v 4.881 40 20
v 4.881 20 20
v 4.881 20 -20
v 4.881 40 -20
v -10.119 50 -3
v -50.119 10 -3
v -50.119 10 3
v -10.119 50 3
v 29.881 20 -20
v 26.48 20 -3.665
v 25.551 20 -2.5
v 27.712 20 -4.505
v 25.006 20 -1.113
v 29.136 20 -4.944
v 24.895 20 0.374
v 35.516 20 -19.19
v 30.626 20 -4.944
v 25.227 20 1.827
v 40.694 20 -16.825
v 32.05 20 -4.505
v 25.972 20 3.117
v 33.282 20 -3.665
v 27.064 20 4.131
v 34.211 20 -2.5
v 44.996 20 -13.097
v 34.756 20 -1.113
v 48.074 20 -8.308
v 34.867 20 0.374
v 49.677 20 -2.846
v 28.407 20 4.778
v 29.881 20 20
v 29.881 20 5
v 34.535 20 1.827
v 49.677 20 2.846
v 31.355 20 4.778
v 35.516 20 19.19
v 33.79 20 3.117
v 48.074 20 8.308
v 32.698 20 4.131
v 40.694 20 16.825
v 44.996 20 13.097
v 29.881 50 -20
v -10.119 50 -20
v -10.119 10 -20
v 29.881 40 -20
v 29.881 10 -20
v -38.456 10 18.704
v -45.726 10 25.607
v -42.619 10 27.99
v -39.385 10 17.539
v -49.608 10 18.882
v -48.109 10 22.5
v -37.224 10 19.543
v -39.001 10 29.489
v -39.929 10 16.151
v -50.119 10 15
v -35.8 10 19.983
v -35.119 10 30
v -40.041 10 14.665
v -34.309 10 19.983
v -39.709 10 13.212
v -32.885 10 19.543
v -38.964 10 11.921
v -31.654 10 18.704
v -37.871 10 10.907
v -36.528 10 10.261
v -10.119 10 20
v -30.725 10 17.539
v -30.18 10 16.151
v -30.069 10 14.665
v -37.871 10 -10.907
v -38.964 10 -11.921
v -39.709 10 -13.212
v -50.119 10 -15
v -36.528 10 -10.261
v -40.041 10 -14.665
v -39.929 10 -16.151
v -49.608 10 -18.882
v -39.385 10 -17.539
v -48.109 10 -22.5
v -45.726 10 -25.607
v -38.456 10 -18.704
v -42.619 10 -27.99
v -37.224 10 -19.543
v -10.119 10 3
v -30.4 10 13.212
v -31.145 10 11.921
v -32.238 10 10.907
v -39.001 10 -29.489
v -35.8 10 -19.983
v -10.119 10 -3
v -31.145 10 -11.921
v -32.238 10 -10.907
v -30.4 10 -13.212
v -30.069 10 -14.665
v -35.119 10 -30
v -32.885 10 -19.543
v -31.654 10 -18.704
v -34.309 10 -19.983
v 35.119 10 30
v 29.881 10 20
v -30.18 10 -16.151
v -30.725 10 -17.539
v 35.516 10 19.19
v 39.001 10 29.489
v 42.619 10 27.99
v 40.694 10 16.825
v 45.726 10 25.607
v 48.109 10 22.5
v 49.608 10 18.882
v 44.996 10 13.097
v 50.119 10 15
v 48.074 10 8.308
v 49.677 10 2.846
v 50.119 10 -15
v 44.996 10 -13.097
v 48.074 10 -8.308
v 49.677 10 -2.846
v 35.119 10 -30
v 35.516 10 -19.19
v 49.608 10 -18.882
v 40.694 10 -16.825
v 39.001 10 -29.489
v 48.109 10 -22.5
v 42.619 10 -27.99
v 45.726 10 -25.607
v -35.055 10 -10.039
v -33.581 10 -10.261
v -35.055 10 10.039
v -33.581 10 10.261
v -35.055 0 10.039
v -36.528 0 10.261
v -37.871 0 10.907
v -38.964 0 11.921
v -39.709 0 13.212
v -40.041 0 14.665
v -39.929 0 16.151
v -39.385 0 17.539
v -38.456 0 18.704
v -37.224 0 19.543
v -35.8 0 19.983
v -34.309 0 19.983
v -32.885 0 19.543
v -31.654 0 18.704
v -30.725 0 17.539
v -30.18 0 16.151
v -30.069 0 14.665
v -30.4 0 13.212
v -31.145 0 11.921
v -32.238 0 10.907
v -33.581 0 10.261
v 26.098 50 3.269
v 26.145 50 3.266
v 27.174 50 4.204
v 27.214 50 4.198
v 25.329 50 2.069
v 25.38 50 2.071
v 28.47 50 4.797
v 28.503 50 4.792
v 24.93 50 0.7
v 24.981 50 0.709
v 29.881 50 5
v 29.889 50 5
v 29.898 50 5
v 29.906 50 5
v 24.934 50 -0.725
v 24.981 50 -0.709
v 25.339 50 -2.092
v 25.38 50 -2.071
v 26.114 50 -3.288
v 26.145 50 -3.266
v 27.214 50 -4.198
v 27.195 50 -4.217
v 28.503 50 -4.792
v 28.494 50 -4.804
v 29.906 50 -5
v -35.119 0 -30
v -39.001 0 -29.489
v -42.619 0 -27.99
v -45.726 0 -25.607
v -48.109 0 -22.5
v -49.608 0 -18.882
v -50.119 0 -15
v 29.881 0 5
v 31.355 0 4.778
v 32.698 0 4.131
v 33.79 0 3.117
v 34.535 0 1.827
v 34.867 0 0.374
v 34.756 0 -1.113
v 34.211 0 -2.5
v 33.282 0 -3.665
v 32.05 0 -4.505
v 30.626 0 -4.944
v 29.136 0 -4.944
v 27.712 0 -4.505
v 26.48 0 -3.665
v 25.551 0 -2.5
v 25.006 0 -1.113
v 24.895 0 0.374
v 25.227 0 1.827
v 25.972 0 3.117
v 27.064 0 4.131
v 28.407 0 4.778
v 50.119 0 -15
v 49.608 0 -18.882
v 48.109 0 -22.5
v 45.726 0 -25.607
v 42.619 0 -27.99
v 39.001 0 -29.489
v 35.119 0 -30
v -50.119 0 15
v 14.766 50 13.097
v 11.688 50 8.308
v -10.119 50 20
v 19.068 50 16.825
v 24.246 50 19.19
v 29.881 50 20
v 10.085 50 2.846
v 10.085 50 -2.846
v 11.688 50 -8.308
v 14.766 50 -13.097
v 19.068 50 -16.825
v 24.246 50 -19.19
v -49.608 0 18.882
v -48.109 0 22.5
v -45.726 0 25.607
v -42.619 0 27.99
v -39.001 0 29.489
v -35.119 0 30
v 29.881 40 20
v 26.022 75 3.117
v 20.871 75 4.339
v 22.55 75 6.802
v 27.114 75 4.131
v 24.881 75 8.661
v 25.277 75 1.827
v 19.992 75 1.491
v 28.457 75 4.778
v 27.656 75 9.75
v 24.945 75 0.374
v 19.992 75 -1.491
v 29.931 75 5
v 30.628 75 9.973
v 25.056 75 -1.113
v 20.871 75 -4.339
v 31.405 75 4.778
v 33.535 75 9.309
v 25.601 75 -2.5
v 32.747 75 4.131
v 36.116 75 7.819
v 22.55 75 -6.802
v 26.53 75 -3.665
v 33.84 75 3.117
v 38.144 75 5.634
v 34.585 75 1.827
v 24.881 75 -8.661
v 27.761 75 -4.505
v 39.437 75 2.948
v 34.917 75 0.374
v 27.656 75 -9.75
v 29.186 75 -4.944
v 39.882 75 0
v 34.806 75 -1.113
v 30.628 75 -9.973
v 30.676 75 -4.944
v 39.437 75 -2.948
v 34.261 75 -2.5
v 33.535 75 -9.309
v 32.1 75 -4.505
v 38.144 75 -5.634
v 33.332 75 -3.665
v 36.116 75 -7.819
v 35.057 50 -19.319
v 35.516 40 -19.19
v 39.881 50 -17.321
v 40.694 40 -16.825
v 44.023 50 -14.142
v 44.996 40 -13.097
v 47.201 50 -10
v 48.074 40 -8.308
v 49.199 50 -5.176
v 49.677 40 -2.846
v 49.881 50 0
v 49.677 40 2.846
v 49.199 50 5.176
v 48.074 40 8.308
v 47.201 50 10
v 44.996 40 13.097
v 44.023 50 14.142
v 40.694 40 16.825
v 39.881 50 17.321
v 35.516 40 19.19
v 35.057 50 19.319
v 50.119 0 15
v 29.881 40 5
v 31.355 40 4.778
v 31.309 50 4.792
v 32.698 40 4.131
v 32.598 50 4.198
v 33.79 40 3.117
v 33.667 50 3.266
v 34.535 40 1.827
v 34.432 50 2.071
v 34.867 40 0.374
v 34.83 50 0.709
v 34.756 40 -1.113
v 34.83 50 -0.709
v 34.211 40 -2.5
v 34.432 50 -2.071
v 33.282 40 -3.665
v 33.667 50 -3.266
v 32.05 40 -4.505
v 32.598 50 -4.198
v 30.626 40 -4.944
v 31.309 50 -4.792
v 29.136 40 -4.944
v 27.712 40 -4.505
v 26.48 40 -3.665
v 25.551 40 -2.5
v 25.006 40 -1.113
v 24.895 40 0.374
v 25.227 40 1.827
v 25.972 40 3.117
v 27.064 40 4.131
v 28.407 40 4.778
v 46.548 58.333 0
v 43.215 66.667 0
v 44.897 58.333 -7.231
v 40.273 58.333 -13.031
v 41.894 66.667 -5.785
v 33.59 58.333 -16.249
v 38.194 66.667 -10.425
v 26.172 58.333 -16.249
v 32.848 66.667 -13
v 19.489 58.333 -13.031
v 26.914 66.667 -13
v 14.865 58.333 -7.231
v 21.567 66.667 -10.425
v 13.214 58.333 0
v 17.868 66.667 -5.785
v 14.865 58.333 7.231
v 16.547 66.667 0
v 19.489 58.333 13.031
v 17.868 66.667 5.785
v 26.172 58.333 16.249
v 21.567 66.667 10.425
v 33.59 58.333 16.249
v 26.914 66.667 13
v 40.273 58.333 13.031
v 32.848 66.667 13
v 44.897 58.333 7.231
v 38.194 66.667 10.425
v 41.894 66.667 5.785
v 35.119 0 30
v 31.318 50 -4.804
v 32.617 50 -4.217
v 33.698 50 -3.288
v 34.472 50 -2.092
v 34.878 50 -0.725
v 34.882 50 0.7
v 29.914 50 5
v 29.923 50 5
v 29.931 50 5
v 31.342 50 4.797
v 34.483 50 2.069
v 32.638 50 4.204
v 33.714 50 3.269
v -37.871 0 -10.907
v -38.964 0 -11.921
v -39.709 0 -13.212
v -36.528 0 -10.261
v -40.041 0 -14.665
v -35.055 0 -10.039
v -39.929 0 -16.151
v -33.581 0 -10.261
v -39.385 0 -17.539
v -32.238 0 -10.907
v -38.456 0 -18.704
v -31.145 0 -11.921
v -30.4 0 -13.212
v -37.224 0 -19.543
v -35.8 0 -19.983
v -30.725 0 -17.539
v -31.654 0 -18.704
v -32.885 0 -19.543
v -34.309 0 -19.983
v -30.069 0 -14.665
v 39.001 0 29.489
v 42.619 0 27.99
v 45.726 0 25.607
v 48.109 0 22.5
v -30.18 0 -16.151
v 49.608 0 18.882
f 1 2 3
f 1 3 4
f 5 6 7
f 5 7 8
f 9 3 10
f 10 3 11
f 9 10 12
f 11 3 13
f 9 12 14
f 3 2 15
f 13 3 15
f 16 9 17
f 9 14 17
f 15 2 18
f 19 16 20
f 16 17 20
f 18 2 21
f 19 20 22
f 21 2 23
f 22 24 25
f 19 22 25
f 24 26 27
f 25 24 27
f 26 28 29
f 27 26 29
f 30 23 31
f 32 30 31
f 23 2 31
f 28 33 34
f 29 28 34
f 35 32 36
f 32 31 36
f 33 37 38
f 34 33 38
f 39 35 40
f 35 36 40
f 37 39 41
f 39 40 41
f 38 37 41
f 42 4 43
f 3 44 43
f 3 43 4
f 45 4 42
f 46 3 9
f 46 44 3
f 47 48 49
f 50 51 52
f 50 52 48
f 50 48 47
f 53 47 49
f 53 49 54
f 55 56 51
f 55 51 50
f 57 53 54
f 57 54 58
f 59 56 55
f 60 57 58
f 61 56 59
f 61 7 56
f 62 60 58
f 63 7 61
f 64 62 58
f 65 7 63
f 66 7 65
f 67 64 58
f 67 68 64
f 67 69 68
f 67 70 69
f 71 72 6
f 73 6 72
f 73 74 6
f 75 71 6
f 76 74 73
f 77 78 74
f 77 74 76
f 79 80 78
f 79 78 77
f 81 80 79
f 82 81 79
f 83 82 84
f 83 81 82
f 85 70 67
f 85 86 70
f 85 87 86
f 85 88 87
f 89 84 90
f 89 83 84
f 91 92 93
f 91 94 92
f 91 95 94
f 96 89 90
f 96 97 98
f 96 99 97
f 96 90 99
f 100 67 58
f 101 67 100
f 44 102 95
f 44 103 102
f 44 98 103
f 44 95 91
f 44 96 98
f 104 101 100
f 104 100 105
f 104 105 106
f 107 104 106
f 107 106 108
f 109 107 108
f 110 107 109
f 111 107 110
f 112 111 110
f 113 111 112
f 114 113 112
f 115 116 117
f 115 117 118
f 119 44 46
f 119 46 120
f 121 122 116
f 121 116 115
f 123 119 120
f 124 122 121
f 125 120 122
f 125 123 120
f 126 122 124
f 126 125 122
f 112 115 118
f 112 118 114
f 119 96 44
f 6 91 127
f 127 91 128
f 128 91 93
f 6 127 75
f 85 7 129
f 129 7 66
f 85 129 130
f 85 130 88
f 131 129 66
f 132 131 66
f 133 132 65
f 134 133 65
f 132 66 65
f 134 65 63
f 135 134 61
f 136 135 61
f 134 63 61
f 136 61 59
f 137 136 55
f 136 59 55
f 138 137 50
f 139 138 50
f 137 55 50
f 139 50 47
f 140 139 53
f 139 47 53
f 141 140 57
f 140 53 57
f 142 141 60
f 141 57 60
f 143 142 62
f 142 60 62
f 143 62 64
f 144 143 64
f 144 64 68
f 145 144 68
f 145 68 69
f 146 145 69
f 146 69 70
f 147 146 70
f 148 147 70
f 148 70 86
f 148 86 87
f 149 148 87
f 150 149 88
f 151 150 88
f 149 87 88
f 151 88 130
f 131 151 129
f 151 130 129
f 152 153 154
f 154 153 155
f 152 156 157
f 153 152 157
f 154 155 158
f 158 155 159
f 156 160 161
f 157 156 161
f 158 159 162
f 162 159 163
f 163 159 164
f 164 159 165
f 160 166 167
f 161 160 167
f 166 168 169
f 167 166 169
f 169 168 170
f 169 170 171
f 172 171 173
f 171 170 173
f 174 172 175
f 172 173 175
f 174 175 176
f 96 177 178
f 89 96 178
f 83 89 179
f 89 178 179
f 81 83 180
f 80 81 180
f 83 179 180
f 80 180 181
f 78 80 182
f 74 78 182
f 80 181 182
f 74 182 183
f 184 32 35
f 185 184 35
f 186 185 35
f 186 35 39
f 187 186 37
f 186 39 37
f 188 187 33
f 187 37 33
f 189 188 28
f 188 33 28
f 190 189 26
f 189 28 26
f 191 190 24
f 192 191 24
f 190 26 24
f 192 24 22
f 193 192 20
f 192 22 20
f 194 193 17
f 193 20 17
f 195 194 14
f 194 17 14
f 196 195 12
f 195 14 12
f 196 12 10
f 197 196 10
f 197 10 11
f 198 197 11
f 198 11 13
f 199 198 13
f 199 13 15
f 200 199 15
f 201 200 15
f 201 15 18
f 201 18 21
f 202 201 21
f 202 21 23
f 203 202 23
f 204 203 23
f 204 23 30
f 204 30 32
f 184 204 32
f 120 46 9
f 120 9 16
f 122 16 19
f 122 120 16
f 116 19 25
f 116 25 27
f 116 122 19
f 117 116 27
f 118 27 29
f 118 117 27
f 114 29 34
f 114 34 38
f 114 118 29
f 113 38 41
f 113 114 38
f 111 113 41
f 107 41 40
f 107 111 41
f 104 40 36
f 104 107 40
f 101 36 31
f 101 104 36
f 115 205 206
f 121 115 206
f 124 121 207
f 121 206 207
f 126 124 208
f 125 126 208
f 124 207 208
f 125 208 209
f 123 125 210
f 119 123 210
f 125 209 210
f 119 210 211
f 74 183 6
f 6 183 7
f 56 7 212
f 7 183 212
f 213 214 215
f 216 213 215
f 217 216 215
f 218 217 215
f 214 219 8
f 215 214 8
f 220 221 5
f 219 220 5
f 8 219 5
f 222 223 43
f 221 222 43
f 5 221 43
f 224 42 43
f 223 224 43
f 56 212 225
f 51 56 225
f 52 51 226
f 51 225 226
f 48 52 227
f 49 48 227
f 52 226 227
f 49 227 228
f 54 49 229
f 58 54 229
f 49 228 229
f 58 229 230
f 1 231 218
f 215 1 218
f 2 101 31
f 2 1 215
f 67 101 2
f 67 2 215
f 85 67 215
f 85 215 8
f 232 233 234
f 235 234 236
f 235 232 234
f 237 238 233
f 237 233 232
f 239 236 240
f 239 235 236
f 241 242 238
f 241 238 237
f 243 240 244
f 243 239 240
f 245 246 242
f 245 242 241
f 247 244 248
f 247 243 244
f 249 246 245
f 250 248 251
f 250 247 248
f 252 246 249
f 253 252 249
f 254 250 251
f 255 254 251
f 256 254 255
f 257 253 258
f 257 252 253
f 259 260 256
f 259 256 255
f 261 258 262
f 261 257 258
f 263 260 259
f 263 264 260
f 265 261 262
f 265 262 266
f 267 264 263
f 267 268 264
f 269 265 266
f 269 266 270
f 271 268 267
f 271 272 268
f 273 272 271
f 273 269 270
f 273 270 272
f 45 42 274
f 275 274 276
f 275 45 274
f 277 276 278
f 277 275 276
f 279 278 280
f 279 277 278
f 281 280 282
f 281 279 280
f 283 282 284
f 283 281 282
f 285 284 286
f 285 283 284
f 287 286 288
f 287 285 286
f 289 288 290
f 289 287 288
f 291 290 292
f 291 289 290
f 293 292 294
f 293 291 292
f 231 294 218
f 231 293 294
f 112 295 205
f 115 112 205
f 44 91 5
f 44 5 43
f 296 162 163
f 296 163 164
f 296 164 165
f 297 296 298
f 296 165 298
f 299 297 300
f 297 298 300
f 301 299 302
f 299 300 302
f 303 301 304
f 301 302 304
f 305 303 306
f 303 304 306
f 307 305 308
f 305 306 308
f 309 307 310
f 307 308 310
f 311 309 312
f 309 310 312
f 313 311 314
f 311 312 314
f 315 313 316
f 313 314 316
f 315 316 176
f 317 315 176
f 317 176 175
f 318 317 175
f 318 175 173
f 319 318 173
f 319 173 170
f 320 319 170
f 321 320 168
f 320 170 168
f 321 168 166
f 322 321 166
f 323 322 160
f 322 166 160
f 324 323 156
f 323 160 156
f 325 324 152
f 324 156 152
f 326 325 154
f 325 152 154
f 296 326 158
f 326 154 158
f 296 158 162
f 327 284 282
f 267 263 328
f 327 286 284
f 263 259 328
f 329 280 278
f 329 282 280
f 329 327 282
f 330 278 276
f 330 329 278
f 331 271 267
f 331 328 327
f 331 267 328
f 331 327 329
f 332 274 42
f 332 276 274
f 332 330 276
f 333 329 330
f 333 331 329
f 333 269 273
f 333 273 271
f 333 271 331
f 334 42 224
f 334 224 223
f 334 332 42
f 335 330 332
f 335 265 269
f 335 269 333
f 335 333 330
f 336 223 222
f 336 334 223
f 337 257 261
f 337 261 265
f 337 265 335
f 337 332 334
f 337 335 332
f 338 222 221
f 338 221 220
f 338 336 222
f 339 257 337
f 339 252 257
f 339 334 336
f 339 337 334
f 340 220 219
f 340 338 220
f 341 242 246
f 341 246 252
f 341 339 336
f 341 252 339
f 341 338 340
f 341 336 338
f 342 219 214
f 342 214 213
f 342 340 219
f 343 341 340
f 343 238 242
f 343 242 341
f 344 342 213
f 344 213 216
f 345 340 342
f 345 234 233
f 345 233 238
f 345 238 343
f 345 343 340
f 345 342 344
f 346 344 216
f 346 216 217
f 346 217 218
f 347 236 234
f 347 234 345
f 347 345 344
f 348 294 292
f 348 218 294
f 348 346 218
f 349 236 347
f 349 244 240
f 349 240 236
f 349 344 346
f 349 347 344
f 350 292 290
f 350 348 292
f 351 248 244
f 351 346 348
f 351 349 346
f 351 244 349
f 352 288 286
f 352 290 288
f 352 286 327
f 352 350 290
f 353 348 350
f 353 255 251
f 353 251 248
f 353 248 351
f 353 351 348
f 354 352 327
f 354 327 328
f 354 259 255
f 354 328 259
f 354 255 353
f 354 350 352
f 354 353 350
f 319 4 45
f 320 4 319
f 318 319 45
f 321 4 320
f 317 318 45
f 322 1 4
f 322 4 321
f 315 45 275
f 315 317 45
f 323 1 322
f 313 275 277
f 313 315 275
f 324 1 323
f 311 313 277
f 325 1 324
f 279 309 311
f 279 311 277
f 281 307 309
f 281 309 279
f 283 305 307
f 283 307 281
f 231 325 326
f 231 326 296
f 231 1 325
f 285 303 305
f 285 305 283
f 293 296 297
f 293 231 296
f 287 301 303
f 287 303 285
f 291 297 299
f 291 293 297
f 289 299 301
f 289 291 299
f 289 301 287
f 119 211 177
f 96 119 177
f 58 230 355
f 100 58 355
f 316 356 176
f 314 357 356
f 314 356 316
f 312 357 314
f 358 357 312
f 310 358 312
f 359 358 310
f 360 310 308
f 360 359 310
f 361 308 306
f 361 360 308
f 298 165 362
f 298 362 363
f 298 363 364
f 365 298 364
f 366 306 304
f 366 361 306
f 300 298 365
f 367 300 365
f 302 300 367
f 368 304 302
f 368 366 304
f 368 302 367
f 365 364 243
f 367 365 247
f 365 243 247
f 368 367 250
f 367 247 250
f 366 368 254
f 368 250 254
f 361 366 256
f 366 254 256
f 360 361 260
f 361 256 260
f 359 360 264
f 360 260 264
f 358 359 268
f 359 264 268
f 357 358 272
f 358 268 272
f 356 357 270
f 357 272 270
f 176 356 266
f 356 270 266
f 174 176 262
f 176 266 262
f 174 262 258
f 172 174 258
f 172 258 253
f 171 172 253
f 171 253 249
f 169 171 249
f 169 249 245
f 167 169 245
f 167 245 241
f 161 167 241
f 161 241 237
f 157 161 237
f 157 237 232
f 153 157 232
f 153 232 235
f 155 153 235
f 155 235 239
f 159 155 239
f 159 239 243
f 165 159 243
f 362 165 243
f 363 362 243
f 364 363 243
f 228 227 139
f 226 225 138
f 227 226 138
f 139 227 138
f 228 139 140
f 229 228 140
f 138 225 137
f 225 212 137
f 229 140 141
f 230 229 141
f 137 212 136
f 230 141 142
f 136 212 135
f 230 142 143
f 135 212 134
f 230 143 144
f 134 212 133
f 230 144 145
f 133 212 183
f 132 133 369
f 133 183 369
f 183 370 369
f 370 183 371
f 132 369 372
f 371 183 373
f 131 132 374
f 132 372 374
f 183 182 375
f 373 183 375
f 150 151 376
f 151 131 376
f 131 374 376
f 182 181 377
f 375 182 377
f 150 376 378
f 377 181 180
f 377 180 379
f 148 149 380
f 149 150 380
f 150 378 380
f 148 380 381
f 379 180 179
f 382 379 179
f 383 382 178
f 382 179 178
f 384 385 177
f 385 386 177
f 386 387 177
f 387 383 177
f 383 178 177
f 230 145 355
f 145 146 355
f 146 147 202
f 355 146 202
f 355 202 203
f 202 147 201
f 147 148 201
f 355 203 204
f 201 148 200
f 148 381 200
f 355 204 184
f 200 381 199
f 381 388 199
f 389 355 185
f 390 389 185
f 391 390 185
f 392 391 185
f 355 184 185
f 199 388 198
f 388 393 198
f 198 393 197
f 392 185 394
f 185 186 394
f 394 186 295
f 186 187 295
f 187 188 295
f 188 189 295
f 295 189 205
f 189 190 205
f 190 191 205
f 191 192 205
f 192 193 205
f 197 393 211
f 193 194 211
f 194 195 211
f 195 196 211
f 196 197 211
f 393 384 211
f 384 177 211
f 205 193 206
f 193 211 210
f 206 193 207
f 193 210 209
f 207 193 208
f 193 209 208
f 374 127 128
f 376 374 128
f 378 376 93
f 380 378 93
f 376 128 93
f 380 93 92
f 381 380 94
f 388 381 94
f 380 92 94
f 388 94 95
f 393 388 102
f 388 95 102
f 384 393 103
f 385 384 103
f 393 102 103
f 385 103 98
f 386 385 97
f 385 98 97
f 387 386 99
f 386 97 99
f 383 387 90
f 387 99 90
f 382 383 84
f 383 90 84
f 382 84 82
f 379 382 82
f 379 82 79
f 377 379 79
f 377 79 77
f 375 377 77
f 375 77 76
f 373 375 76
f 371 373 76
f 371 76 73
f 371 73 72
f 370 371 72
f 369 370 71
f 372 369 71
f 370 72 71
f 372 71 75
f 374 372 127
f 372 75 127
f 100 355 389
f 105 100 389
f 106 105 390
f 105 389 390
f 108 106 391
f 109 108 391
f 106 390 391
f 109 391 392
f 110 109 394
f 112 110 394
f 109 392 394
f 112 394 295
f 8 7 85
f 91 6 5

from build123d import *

# Parameters (mm, degrees)
BOSS_EXTRUDE4_DEPTH = 10
SKETCH4_R           = 5
CUT_EXTRUDE2_DEPTH  = 10
BOSS_EXTRUDE5_DEPTH = 40
SKETCH6_R           = 5
CUT_EXTRUDE4_DEPTH  = 60
SKETCH7_W           = 45
SKETCH7_H           = 20
CUT_EXTRUDE5_DEPTH  = 40
RIB1_REACH          = 78.889
SKETCH8_WALL_W      = 212.346557286
SKETCH8_WALL_H      = 6
SKETCH9_R           = 20
BOSS_EXTRUDE7_DEPTH = 25
BOSS_EXTRUDE7_TAPER = 21.8
SKETCH15_R          = 5
CUT_EXTRUDE6_DEPTH  = 25


with BuildPart() as part:
    # Sketch1 → Boss-Extrude4 (new body)
    with BuildSketch(Plane(origin=(0, 0, 0), x_dir=(1, 0, 0), z_dir=(0, 1, 0))):
        with BuildLine():
            Line((-35.119052847, -30), (35.119052847, -30))
            ThreePointArc((35.119052847, -30), (45.725654565, -25.606601718), (50.119052847, -15))
            Line((50.119052847, -15), (50.119052847, 15))
            ThreePointArc((50.119052847, 15), (45.725654565, 25.606601718), (35.119052847, 30))
            Line((35.119052847, 30), (-35.119052847, 30))
            ThreePointArc((-35.119052847, 30), (-45.725654565, 25.606601718), (-50.119052847, 15))
            Line((-50.119052847, 15), (-50.119052847, -15))
            ThreePointArc((-50.119052847, -15), (-45.725654565, -25.606601718), (-35.119052847, -30))
        make_face()
    extrude(amount=BOSS_EXTRUDE4_DEPTH)

    # Sketch4 → Cut-Extrude2 (cut)
    with BuildSketch(Plane(origin=(0, 10, 0), x_dir=(1, 0, 0), z_dir=(0, 1, 0))):
        with Locations(Location((-35.054653665, 15.038511516, 0), (0, 0, 270))):
            Circle(SKETCH4_R)
        with Locations(Location((-35.054653665, -15.038511516, 0), (0, 0, 90))):
            Circle(SKETCH4_R)
    extrude(amount=-CUT_EXTRUDE2_DEPTH, mode=Mode.SUBTRACT)

    # Sketch5 → Boss-Extrude5 (add)
    with BuildSketch(Plane(origin=(0, 10, 0), x_dir=(1, 0, 0), z_dir=(0, 1, 0))):
        with BuildLine():
            Line((-10.119052847, -20), (-10.119052847, 20))
            Line((-10.119052847, 20), (29.880947153, 20))
            ThreePointArc((29.880947153, 20), (49.880947153, 0), (29.880947153, -20))
            Line((29.880947153, -20), (-10.119052847, -20))
        make_face()
    extrude(amount=BOSS_EXTRUDE5_DEPTH)

    # Sketch6 → Cut-Extrude4 (cut)
    with BuildSketch(Plane(origin=(0, 50, 0), x_dir=(1, 0, 0), z_dir=(0, 1, 0))):
        with Locations(Location((29.880947153, 0, 0), (0, 0, 270))):
            Circle(SKETCH6_R)
    extrude(amount=-CUT_EXTRUDE4_DEPTH, mode=Mode.SUBTRACT)

    # Sketch7 → Cut-Extrude5 (cut)
    with BuildSketch(Plane.XY.offset(20)):
        with Locations((27.380947153, 30)):
            Rectangle(SKETCH7_W, SKETCH7_H)
    extrude(amount=-CUT_EXTRUDE5_DEPTH, mode=Mode.SUBTRACT)

    # Sketch8 wall → Rib1 (add, up to next)
    with BuildSketch(Plane(origin=(-30.119052847, 30, 0), x_dir=(0.707106781187, 0.707106781187, 0), z_dir=(-0.707106781187, 0.707106781187, 0)), mode=Mode.PRIVATE) as rib1_sk1:
        Rectangle(SKETCH8_WALL_W, SKETCH8_WALL_H)
    rib1_tool1 = extrude(rib1_sk1.sketch, amount=-RIB1_REACH, mode=Mode.PRIVATE) - part.part
    add(rib1_tool1.solids().sort_by_distance((-30.119052847, 30, 0))[0])

    # Sketch9 → Boss-Extrude7 (add)
    with BuildSketch(Plane(origin=(0, 50, 0), x_dir=(1, 0, 0), z_dir=(0, 1, 0))):
        with Locations((29.880947153, 0)):
            Circle(SKETCH9_R)
    extrude(amount=BOSS_EXTRUDE7_DEPTH, taper=BOSS_EXTRUDE7_TAPER)

    # Sketch15 → Cut-Extrude6 (cut)
    with BuildSketch(Plane(origin=(0, 75, 0), x_dir=(1, 0, 0), z_dir=(0, 1, 0))):
        with Locations(Location((29.9308784, 0, 0), (0, 0, 270))):
            Circle(SKETCH15_R)
    extrude(amount=-CUT_EXTRUDE6_DEPTH, mode=Mode.SUBTRACT)


solid = part.part
